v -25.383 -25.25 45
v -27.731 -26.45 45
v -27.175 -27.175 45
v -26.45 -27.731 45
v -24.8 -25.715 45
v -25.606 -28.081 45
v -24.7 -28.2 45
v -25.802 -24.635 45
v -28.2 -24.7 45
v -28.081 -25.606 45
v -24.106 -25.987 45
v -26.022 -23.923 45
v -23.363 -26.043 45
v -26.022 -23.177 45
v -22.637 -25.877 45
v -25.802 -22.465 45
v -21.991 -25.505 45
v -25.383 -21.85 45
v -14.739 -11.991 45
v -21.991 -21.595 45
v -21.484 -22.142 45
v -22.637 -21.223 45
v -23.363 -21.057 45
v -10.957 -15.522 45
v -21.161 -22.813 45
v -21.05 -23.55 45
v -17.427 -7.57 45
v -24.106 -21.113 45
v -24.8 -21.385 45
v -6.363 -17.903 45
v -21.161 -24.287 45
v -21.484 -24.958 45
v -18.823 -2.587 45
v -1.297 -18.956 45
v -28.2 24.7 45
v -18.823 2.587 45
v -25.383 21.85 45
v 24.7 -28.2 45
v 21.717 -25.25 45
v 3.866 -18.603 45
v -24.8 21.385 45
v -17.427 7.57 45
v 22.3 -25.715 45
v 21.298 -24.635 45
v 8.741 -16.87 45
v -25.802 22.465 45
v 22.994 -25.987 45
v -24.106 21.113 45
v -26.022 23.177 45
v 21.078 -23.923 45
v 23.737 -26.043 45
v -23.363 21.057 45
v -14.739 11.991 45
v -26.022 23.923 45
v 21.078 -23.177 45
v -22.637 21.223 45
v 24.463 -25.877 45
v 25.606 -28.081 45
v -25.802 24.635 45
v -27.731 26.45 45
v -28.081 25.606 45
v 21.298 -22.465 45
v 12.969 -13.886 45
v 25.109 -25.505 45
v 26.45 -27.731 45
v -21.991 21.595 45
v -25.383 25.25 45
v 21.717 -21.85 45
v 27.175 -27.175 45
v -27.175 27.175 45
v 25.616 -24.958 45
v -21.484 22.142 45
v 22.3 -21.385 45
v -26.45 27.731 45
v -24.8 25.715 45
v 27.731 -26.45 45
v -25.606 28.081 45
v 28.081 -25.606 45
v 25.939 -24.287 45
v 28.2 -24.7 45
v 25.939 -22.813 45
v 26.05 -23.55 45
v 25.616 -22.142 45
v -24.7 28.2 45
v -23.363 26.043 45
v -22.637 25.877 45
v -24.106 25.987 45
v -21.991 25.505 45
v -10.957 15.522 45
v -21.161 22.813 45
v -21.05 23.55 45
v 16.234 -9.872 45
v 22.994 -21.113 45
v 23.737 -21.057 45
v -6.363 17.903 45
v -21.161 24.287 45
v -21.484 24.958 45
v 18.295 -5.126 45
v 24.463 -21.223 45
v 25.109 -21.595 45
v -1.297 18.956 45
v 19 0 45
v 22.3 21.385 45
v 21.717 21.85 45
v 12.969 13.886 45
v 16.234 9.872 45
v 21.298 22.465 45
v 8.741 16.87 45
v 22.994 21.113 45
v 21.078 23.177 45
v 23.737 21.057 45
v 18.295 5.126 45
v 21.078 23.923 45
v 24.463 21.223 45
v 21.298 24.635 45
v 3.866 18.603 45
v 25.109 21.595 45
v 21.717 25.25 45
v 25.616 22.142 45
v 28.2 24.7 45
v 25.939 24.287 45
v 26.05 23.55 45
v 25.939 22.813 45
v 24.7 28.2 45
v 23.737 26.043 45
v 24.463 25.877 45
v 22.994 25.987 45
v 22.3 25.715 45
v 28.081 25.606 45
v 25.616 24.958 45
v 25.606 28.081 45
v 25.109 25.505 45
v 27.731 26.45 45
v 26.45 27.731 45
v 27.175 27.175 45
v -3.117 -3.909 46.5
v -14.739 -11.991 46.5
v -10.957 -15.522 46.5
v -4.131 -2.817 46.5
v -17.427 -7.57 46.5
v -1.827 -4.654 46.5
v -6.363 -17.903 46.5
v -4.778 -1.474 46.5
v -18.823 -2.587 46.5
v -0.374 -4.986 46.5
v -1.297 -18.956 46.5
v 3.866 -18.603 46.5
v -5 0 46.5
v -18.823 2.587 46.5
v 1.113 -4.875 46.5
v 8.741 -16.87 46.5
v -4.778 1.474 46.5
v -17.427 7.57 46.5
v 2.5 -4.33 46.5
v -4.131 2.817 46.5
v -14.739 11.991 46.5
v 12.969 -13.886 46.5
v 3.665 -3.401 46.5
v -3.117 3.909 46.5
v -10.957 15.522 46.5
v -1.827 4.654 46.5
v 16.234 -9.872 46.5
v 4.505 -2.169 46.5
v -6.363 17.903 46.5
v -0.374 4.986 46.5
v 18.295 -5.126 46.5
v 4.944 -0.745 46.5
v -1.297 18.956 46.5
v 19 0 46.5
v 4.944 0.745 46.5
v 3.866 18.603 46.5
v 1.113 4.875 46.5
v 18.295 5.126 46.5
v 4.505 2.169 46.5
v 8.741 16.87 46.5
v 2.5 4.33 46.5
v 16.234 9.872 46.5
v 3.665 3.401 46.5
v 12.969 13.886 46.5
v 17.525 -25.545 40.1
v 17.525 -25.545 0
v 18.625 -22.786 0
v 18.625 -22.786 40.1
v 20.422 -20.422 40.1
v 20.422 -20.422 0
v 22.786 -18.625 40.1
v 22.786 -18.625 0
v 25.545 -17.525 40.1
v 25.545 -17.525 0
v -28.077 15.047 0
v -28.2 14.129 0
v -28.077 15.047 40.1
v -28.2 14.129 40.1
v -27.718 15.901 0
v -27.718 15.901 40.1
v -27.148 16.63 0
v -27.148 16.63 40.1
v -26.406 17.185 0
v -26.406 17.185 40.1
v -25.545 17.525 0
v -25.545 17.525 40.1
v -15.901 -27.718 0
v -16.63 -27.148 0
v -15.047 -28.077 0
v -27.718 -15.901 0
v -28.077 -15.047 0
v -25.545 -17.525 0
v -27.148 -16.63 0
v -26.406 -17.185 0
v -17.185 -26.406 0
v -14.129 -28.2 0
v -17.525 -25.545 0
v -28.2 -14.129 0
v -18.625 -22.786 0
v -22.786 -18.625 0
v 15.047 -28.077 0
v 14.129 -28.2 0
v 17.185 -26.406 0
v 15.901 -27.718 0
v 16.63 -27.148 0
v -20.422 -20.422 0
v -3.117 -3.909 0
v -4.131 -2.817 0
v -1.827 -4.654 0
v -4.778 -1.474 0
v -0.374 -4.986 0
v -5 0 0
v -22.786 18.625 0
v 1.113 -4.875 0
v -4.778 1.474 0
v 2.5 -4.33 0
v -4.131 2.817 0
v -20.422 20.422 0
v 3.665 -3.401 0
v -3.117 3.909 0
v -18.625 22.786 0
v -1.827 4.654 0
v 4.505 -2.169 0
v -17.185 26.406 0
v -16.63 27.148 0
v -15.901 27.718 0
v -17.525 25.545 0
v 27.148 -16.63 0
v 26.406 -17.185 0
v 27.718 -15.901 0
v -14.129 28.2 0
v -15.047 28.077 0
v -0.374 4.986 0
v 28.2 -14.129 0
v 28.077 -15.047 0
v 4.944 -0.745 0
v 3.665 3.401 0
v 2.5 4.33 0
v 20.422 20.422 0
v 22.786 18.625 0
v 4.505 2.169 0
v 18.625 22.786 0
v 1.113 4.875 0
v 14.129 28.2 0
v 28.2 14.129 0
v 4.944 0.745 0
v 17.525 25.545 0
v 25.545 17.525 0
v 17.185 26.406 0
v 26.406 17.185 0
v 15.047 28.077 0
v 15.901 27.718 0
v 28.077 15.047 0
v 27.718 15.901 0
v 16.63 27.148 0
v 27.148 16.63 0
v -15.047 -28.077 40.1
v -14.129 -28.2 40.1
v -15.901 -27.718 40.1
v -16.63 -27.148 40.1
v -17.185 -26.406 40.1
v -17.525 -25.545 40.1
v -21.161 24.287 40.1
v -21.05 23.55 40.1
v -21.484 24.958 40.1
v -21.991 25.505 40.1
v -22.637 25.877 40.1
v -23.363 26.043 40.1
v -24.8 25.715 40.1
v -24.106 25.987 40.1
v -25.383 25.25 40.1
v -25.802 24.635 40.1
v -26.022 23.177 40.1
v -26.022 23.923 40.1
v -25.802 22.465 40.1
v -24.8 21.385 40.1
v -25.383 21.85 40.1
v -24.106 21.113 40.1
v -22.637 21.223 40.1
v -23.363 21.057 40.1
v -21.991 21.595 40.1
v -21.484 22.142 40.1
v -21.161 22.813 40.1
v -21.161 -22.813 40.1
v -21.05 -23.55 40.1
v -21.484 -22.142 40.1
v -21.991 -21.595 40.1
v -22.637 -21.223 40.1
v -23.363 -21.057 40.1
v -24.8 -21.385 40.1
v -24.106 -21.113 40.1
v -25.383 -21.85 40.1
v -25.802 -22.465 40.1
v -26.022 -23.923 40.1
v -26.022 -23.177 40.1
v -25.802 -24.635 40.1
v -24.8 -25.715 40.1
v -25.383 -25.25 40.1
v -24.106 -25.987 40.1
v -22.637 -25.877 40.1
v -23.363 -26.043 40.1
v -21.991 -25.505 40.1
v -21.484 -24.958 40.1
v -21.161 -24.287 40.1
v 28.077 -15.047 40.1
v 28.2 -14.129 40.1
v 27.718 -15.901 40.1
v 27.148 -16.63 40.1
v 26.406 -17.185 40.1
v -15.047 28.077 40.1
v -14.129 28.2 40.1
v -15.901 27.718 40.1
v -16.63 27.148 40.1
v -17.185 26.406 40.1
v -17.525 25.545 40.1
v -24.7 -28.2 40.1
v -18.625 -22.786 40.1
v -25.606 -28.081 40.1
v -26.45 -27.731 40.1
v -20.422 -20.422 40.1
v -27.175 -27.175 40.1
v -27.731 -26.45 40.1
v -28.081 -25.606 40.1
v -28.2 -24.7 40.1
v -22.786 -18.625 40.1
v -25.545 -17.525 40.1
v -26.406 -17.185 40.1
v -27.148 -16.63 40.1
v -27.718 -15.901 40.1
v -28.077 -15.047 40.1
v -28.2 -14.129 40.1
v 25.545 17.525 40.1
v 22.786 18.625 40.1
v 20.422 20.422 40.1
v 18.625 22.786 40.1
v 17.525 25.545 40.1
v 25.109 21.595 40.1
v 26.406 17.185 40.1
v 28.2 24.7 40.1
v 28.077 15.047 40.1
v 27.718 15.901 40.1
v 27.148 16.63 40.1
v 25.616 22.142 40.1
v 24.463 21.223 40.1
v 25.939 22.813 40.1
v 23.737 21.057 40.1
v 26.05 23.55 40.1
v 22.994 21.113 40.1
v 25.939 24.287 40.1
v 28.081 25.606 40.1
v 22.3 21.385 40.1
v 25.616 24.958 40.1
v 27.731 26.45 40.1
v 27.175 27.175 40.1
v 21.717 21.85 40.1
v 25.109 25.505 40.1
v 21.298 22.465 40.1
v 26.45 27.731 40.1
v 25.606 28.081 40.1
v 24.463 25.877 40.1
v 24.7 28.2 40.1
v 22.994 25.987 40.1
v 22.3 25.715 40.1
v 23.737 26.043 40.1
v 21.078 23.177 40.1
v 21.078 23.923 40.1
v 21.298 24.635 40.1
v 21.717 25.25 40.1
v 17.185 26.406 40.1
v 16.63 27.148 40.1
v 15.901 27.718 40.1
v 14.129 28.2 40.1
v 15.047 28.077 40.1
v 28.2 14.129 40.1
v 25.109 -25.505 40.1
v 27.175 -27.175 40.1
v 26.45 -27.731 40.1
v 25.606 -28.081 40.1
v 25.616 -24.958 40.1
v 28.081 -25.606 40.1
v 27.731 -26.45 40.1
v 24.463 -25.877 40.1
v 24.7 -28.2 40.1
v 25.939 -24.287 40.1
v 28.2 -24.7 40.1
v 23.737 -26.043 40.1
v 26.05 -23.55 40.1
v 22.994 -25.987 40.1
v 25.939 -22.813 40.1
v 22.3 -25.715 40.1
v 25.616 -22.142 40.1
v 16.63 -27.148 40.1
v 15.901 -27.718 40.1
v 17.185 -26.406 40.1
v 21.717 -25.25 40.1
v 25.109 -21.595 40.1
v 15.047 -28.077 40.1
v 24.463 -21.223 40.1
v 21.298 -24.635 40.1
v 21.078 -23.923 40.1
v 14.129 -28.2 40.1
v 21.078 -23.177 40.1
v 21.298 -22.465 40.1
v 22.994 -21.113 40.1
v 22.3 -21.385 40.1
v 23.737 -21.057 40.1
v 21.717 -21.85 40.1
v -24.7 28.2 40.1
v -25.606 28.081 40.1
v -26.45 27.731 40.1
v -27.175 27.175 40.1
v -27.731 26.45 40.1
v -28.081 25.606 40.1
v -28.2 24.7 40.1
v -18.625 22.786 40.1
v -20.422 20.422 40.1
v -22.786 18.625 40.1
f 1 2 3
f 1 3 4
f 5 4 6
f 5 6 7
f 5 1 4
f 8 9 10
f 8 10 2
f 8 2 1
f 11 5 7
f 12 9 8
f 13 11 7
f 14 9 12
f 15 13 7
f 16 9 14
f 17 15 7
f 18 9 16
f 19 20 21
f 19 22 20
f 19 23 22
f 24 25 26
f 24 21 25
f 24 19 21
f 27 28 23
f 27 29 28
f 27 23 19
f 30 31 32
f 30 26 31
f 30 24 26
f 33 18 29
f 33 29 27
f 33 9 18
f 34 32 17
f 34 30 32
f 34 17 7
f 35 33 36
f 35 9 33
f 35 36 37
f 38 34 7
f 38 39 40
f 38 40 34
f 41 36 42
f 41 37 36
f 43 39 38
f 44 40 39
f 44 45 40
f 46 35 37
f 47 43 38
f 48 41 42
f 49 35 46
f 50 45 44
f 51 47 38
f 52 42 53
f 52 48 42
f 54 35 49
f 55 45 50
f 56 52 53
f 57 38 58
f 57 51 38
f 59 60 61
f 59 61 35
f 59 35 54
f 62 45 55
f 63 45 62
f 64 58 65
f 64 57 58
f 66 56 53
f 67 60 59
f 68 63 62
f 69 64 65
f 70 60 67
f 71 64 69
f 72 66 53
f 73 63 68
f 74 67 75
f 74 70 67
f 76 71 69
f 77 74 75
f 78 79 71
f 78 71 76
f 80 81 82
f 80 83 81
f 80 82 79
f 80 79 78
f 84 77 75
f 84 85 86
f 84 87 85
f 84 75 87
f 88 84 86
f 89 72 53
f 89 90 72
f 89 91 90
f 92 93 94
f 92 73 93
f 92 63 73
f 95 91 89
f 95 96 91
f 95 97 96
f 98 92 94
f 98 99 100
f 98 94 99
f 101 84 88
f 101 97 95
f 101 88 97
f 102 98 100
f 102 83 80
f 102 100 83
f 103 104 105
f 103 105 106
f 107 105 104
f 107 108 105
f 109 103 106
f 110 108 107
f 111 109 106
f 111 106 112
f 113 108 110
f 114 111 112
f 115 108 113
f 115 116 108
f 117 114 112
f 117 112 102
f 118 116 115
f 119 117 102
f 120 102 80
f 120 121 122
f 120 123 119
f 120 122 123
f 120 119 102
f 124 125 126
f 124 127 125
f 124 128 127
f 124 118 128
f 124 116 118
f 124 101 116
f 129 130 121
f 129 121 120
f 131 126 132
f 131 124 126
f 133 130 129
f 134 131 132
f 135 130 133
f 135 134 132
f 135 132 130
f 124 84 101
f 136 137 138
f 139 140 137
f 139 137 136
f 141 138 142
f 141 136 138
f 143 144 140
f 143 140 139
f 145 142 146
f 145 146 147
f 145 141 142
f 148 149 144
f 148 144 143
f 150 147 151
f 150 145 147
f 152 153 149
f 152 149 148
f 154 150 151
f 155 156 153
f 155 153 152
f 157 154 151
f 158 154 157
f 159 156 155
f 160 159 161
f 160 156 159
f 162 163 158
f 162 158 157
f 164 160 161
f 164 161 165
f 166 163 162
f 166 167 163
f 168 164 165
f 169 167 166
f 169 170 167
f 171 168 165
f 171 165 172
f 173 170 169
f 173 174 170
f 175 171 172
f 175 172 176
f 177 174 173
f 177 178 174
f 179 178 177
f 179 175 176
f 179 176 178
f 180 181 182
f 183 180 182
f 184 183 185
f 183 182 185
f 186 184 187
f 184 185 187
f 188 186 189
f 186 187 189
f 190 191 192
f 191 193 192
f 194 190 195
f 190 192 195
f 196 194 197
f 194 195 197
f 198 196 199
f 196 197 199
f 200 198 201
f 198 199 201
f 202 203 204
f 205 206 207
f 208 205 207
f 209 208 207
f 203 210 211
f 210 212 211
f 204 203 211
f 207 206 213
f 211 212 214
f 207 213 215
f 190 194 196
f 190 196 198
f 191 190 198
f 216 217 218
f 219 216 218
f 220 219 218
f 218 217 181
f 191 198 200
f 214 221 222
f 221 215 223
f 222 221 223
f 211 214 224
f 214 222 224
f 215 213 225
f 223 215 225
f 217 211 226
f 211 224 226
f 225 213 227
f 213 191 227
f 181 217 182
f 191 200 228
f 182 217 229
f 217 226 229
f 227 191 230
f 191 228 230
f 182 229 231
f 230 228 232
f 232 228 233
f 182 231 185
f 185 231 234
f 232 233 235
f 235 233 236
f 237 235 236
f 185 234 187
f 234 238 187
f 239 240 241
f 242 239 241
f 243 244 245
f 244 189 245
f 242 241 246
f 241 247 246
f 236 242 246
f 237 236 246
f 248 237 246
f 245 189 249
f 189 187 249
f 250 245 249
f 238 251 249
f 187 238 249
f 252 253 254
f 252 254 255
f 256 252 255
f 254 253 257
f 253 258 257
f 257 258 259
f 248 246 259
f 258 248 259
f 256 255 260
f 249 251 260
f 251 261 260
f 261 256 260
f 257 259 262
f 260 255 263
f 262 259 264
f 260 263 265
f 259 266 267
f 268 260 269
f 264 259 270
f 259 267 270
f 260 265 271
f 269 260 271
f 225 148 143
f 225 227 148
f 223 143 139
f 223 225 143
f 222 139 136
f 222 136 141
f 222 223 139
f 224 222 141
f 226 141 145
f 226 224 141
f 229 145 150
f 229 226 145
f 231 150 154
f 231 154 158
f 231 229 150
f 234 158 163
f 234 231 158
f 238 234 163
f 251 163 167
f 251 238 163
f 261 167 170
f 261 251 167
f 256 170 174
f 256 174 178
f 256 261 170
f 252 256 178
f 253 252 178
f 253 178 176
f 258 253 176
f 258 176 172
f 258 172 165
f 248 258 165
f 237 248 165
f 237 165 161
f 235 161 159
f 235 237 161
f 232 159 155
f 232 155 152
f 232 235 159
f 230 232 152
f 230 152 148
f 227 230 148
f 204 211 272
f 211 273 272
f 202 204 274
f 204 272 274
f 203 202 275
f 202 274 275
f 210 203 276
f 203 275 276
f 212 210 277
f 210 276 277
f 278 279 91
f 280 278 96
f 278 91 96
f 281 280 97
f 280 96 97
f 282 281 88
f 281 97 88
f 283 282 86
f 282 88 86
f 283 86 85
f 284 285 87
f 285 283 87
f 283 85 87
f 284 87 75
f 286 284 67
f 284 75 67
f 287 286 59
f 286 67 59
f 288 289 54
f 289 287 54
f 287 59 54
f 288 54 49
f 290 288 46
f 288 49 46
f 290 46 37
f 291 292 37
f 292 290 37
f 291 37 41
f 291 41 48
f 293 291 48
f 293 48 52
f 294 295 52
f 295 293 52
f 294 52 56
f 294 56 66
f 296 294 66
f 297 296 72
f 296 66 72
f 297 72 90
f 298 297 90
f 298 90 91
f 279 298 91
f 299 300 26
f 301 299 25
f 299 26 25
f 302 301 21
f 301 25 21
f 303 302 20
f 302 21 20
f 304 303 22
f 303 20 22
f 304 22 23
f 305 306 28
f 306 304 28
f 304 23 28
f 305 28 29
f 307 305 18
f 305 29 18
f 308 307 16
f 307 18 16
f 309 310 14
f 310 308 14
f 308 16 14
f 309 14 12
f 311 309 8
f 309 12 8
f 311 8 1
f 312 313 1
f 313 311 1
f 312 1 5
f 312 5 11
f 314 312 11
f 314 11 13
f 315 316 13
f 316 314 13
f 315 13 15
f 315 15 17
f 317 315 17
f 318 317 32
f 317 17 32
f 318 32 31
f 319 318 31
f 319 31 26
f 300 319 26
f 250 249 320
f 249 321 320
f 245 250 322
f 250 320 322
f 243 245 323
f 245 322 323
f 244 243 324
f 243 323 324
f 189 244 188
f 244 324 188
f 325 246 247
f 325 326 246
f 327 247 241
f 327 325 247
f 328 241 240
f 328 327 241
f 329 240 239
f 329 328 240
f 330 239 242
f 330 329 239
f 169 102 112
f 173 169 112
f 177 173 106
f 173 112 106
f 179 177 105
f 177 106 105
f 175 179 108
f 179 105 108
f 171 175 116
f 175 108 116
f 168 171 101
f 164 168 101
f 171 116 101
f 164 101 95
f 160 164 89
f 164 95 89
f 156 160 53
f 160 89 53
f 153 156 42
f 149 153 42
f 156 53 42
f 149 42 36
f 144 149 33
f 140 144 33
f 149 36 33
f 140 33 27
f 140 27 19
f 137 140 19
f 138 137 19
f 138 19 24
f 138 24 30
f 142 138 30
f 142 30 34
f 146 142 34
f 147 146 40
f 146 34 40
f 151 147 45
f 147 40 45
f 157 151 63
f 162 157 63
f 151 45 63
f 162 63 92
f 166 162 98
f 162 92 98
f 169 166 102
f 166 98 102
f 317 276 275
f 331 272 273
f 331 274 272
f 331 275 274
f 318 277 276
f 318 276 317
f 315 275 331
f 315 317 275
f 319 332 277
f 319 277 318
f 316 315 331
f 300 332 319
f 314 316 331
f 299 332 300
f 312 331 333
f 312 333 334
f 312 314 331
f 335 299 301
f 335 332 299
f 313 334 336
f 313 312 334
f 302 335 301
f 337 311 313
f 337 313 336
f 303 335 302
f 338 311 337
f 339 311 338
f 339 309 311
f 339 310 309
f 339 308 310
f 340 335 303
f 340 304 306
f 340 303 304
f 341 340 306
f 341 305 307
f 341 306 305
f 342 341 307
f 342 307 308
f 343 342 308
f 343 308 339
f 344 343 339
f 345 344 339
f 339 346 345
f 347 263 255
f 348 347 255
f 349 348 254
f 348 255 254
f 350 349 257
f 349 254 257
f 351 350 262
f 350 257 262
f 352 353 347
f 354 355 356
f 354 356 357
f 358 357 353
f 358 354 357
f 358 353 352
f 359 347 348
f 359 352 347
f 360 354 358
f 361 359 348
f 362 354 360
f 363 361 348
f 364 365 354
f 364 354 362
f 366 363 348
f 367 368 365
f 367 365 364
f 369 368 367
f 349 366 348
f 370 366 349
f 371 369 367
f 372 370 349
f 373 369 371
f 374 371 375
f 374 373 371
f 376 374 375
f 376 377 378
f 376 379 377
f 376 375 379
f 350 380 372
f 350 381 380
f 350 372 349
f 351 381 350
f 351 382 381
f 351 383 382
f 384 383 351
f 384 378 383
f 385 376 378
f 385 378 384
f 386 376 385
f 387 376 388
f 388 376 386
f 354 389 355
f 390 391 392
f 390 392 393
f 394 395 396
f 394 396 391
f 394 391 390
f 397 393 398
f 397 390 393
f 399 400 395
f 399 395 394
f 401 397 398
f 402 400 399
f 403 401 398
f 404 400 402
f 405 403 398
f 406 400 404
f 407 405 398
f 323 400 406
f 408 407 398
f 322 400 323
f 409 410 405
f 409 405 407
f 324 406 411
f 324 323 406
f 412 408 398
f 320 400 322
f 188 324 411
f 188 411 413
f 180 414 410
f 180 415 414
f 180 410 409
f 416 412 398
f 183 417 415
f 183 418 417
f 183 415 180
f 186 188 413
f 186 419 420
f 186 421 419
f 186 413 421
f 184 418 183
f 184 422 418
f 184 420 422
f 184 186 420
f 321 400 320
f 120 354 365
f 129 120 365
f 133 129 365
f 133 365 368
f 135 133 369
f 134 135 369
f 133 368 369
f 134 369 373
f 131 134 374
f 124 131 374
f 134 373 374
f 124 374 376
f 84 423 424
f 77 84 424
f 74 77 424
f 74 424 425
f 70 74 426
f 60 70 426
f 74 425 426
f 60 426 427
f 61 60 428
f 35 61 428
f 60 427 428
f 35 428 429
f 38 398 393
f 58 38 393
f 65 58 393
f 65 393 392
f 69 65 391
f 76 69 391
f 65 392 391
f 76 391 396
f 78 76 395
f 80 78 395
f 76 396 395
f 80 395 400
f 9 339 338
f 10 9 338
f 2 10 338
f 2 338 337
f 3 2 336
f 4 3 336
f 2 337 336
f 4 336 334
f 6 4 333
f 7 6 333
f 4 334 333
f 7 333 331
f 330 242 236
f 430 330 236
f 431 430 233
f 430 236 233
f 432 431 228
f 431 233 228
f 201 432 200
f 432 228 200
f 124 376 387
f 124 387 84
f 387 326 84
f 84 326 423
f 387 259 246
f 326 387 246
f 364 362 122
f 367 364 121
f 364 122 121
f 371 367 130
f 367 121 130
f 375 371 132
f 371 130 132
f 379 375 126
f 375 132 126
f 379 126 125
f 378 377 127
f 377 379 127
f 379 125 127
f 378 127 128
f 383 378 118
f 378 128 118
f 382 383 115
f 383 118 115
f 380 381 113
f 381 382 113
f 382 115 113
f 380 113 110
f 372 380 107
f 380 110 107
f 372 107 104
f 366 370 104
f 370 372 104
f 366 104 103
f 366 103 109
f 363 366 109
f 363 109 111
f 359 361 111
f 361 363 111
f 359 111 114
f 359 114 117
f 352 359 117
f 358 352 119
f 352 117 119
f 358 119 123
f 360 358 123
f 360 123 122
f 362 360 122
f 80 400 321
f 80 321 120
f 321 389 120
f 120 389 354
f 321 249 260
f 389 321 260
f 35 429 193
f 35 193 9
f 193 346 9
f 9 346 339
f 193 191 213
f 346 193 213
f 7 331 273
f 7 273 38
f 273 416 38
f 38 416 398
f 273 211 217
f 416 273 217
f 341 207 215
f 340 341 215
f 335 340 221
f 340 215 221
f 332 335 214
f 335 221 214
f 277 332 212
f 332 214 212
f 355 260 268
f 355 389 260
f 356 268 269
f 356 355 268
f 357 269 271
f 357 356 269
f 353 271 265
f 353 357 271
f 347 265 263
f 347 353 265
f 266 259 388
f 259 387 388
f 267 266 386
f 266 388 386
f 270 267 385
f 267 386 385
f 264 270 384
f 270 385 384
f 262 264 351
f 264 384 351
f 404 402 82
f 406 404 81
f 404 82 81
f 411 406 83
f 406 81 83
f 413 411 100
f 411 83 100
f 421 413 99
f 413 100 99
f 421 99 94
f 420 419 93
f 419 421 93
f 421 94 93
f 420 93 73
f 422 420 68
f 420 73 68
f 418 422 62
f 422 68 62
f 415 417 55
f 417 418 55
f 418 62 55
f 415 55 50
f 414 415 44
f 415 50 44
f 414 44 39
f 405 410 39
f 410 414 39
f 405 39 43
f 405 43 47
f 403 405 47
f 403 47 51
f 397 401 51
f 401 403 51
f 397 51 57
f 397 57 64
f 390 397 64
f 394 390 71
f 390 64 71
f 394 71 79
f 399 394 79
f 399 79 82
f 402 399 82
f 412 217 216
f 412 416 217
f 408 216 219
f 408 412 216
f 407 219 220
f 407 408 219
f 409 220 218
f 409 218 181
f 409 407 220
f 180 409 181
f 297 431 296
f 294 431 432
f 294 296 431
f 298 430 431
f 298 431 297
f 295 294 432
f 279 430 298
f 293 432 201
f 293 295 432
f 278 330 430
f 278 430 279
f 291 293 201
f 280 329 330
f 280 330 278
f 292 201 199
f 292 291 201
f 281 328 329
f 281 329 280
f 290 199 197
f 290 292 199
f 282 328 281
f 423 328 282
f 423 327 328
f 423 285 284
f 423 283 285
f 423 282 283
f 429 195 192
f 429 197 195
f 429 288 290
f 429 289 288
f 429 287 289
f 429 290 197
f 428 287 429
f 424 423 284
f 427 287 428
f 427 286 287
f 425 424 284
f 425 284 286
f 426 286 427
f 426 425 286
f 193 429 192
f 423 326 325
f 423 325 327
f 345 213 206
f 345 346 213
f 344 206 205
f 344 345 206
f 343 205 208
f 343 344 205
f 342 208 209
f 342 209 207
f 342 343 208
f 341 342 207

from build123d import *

# Parameters (mm, degrees)
SKETCH1_R           = 5
BOSS_EXTRUDE1_DEPTH = 45
SKETCH2_R           = 19
SKETCH2_R_2         = 5
BOSS_EXTRUDE2_DEPTH = 1.5
SKETCH3_R           = 2.5
CUT_EXTRUDE1_DEPTH  = 61.128861622
SKETCH4_R           = 2.5
CUT_EXTRUDE2_DEPTH  = 40.1
FILLET1_R           = 3.5


with BuildPart() as part:
    # Sketch1 → Boss-Extrude1 (new body)
    with BuildSketch(Plane.XY):
        with BuildLine():
            Line((-24.7, -28.2), (24.7, -28.2))
            ThreePointArc((24.7, -28.2), (27.174873734, -27.174873734), (28.2, -24.7))
            Line((28.2, -24.7), (28.2, 24.7))
            ThreePointArc((28.2, 24.7), (27.174873734, 27.174873734), (24.7, 28.2))
            Line((24.7, 28.2), (-24.7, 28.2))
            ThreePointArc((-24.7, 28.2), (-27.174873734, 27.174873734), (-28.2, 24.7))
            Line((-28.2, 24.7), (-28.2, -24.7))
            ThreePointArc((-28.2, -24.7), (-27.174873734, -27.174873734), (-24.7, -28.2))
        make_face()
        with Locations(Location((0, 0, 0), (0, 0, 180))):
            Circle(SKETCH1_R, mode=Mode.SUBTRACT)
    extrude(amount=BOSS_EXTRUDE1_DEPTH)

    # Sketch2 → Boss-Extrude2 (add)
    with BuildSketch(Plane.XY.offset(45)):
        Circle(SKETCH2_R)
        with Locations(Location((0, 0, 0), (0, 0, 180))):
            Circle(SKETCH2_R_2, mode=Mode.SUBTRACT)
    extrude(amount=BOSS_EXTRUDE2_DEPTH)

    # Sketch3 → Cut-Extrude1 (cut, through all)
    with BuildSketch(Plane.XY.offset(45)):
        with Locations((-23.55, 23.55)):
            Circle(SKETCH3_R)
        with Locations((23.55, 23.55)):
            Circle(SKETCH3_R)
        with Locations((23.55, -23.55)):
            Circle(SKETCH3_R)
        with Locations((-23.55, -23.55)):
            Circle(SKETCH3_R)
    extrude(amount=-CUT_EXTRUDE1_DEPTH, mode=Mode.SUBTRACT)

    # Sketch4 → Cut-Extrude2 (cut)
    # profile 1 of 4: a face of its own
    with BuildSketch(Plane(origin=(0, 0, 0), x_dir=(-1, 0, 0), z_dir=(0, 0, -1))):
        with BuildLine():
            ThreePointArc((-28.2, 17.2), (-20.421825407, 20.421825407), (-17.2, 28.2))
            Line((-17.2, 28.2), (-24.7, 28.2))
            ThreePointArc((-24.7, 28.2), (-27.174873734, 27.174873734), (-28.2, 24.7))
            Line((-28.2, 24.7), (-28.2, 17.2))
        make_face()
        with Locations(Location((-23.55, 23.55, 0), (0, 0, 180))):
            Circle(SKETCH4_R, mode=Mode.SUBTRACT)
    # profile 2 of 4: a face of its own
    with BuildSketch(Plane(origin=(0, 0, 0), x_dir=(-1, 0, 0), z_dir=(0, 0, -1))):
        with BuildLine():
            Line((-24.7, -28.2), (-17.2, -28.2))
            ThreePointArc((-17.2, -28.2), (-20.421825407, -20.421825407), (-28.2, -17.2))
            Line((-28.2, -17.2), (-28.2, -24.7))
            ThreePointArc((-28.2, -24.7), (-27.174873734, -27.174873734), (-24.7, -28.2))
        make_face()
        with Locations(Location((-23.55, -23.55, 0), (0, 0, 180))):
            Circle(SKETCH4_R, mode=Mode.SUBTRACT)
    # profile 3 of 4: a face of its own
    with BuildSketch(Plane(origin=(0, 0, 0), x_dir=(-1, 0, 0), z_dir=(0, 0, -1))):
        with BuildLine():
            Line((28.2, -24.7), (28.2, -17.2))
            ThreePointArc((28.2, -17.2), (20.421825407, -20.421825407), (17.2, -28.2))
            Line((17.2, -28.2), (24.7, -28.2))
            ThreePointArc((24.7, -28.2), (27.174873734, -27.174873734), (28.2, -24.7))
        make_face()
        with Locations(Location((23.55, -23.55, 0), (0, 0, 180))):
            Circle(SKETCH4_R, mode=Mode.SUBTRACT)
    # profile 4 of 4: a face of its own
    with BuildSketch(Plane(origin=(0, 0, 0), x_dir=(-1, 0, 0), z_dir=(0, 0, -1))):
        with BuildLine():
            ThreePointArc((17.2, 28.2), (20.421825407, 20.421825407), (28.2, 17.2))
            Line((28.2, 17.2), (28.2, 24.7))
            ThreePointArc((28.2, 24.7), (27.174873734, 27.174873734), (24.7, 28.2))
            Line((24.7, 28.2), (17.2, 28.2))
        make_face()
        with Locations(Location((23.55, 23.55, 0), (0, 0, 180))):
            Circle(SKETCH4_R, mode=Mode.SUBTRACT)
    extrude(amount=-CUT_EXTRUDE2_DEPTH, mode=Mode.SUBTRACT)

    # Fillet1
    fillet1_edges = [part.edges().sort_by_distance(p)[0] for p in [
        (-17.2, 28.2, 20.05),
        (-28.2, 17.2, 20.05),
        (-17.2, -28.2, 20.05),
        (-28.2, -17.2, 20.05),
        (28.2, -17.2, 20.05),
        (17.2, -28.2, 20.05),
        (28.2, 17.2, 20.05),
        (17.2, 28.2, 20.05),
    ]]
    fillet(fillet1_edges, radius=FILLET1_R)


solid = part.part
